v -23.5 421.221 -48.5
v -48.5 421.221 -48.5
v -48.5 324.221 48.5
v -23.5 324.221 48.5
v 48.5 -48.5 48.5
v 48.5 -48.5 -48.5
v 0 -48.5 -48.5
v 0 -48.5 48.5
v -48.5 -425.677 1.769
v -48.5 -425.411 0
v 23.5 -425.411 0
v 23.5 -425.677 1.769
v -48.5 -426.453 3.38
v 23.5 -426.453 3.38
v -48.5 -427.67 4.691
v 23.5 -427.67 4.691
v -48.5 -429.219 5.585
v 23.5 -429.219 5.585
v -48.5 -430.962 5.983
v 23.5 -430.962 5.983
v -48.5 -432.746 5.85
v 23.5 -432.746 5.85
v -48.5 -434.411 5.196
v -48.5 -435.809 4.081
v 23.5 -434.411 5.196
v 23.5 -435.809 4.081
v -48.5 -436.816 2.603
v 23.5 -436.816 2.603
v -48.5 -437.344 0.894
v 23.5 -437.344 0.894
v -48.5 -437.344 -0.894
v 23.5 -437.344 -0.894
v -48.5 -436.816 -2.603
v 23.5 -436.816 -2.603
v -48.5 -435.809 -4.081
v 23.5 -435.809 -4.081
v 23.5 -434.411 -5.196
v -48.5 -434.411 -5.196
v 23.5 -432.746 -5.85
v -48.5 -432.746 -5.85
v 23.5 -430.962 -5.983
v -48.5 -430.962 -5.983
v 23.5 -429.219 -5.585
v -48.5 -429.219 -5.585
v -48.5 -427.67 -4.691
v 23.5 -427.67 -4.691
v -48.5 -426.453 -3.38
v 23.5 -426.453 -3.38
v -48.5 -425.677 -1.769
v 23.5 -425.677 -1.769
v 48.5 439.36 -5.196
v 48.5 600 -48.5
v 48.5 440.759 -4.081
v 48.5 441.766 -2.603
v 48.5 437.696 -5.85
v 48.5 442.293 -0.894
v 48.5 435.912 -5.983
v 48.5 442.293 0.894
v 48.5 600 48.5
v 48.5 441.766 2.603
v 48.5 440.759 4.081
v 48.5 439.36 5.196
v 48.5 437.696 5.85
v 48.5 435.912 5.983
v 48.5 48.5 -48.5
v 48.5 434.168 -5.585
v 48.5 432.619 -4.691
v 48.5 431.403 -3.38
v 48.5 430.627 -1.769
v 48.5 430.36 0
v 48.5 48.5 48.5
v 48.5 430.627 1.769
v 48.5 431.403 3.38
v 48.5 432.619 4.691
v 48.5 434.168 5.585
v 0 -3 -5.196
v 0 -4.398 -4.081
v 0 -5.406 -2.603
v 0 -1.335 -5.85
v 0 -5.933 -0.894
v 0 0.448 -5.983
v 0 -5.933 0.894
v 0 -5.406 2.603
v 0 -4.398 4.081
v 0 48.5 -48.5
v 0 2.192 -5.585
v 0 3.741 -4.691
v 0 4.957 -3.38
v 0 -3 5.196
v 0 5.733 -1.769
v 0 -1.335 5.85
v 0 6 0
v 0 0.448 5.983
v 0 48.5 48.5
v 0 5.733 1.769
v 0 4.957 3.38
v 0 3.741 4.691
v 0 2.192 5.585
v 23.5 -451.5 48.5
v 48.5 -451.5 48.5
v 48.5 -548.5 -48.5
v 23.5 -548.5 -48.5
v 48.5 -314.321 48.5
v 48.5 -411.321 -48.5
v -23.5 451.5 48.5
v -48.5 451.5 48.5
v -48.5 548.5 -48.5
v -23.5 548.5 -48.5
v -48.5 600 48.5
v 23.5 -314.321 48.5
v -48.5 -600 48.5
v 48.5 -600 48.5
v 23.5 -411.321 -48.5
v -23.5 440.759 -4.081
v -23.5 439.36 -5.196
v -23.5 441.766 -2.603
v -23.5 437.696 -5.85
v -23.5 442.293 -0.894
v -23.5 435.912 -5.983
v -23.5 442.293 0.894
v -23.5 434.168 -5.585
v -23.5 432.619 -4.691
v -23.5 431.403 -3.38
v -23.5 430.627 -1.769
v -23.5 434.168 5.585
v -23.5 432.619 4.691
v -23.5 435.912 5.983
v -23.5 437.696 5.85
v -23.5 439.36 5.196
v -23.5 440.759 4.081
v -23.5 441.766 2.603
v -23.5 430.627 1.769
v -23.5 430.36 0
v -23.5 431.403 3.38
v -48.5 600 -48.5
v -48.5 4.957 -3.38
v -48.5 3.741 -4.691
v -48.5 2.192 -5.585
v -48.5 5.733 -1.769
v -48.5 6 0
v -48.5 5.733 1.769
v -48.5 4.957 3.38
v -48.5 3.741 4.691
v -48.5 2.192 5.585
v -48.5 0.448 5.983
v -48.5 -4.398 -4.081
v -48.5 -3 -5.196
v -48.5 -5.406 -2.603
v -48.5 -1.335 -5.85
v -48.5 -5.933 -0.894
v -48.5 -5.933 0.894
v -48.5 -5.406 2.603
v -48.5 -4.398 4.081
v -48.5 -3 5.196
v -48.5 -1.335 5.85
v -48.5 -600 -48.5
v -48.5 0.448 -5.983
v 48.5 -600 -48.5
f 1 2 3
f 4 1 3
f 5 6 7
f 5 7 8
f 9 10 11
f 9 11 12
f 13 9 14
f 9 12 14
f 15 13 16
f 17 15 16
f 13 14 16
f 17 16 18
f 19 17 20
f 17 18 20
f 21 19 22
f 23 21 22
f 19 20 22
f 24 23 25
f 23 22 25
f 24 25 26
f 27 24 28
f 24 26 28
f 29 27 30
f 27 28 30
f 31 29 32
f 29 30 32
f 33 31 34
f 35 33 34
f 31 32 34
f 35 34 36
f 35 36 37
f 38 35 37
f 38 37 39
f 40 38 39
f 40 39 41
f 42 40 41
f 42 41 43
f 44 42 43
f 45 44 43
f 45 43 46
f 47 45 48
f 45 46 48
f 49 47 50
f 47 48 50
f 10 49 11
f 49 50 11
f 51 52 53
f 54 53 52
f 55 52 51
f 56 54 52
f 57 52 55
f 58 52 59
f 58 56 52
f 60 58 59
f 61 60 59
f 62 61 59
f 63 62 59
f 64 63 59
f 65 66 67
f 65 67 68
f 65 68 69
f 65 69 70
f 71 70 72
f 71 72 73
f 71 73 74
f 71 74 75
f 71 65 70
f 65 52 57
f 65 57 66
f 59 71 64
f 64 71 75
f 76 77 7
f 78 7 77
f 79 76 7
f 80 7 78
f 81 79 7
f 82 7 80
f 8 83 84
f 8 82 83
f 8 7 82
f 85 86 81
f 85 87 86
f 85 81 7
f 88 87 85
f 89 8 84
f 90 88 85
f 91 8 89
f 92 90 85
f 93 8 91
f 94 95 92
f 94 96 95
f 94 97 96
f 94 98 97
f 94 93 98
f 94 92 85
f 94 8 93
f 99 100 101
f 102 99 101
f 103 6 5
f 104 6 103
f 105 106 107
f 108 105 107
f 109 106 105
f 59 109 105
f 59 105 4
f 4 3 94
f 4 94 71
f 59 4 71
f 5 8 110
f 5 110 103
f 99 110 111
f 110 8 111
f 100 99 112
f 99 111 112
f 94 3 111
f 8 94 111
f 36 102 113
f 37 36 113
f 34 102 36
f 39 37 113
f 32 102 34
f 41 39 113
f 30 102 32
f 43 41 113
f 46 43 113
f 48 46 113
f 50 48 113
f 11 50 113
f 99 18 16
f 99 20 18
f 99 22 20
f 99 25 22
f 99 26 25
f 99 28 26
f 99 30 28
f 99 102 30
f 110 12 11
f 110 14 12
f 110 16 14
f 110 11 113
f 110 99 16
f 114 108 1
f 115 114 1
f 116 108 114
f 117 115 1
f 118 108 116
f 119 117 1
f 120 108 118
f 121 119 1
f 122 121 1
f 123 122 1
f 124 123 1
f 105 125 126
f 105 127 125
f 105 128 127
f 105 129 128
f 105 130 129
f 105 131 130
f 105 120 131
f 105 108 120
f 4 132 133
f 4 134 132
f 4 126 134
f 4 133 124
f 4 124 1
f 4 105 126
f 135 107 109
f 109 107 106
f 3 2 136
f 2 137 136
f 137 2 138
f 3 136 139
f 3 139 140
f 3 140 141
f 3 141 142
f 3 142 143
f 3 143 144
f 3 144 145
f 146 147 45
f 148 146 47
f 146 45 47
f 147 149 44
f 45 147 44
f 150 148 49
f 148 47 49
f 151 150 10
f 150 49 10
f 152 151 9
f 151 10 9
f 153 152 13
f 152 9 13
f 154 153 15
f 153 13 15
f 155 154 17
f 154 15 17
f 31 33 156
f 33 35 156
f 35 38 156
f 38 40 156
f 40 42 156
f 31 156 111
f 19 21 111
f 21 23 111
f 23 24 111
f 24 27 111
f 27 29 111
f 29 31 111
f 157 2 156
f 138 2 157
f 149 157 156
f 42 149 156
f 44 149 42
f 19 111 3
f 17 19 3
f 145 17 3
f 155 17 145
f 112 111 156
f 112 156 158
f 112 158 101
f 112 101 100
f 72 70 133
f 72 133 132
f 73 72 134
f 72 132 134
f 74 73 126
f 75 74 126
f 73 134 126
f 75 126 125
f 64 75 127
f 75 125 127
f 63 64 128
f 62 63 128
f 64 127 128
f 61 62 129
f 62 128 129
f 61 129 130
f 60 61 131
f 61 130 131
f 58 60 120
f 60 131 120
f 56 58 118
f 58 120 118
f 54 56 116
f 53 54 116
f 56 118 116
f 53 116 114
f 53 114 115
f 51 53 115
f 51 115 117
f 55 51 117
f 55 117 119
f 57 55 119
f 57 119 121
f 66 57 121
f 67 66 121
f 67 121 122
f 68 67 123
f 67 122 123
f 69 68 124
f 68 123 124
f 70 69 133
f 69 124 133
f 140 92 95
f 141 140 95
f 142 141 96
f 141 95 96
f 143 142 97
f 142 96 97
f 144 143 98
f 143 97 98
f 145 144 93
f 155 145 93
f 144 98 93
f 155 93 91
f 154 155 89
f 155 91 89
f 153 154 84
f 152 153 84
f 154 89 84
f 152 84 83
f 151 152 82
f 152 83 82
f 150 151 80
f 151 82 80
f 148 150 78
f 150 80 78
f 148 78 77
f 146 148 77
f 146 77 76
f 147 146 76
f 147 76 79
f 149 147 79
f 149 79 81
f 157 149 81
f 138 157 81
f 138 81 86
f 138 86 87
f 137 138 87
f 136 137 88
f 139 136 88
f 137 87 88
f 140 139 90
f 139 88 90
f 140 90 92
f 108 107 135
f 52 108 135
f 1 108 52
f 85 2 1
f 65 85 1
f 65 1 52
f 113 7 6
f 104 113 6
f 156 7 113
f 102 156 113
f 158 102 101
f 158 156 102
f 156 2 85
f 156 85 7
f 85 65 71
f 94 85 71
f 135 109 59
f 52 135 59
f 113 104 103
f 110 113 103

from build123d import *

# Parameters (mm, degrees)
F0_W      = 97
F0_H      = 97
F1_DEPTH  = 600
F2_W      = 97
F2_H      = 97
F3_DEPTH  = 48.5
F5_DEPTH  = 25
F7_DEPTH  = 25
F8_R      = 6
F9_DEPTH  = 72
F10_R     = 6
F11_DEPTH = 48.5
F12_R     = 6
F13_DEPTH = 72


with BuildPart() as f1:
    # F0 (on Front) → F1 (new body, symmetric)
    with BuildSketch(Plane.XZ):
        Rectangle(F0_W, F0_H)
    extrude(amount=F1_DEPTH, both=True)

    # F2 (on face) → F3 (cut)
    with BuildSketch(Plane.YZ.offset(48.5)):
        Rectangle(F2_W, F2_H)
    extrude(amount=-F3_DEPTH, mode=Mode.SUBTRACT)

    # F4 (on face) → F5 (cut)
    with BuildSketch(Plane.YZ.offset(48.5)):
        Polygon((-314.321284, 48.5), (-451.5, 48.5), (-548.5, -48.5), (-411.321284, -48.5), align=None)
    extrude(amount=-F5_DEPTH, mode=Mode.SUBTRACT)

    # F6 (on face) → F7 (cut)
    with BuildSketch(Plane(origin=(-48.5, 0, 0), x_dir=(0, -1, 0), z_dir=(-1, 0, 0))):
        Polygon((-324.220779, 48.5), (-451.5, 48.5), (-548.5, -48.5), (-421.220779, -48.5), align=None)
    extrude(amount=-F7_DEPTH, mode=Mode.SUBTRACT)

    # F8 (on face) → F9 (cut, through all)
    with BuildSketch(Plane.YZ.offset(23.5)):
        with Locations((-431.410642, 0)):
            Circle(F8_R)
    extrude(amount=-F9_DEPTH, mode=Mode.SUBTRACT)

    # F10 (on face) → F11 (cut, through all)
    with BuildSketch(Plane.YZ):
        Circle(F10_R)
    extrude(amount=-F11_DEPTH, mode=Mode.SUBTRACT)

    # F12 (on face) → F13 (cut, through all)
    with BuildSketch(Plane(origin=(-23.5, 0, 0), x_dir=(0, -1, 0), z_dir=(-1, 0, 0))):
        with Locations((-436.36039, 0)):
            Circle(F12_R)
    extrude(amount=-F13_DEPTH, mode=Mode.SUBTRACT)


solid = f1.part
